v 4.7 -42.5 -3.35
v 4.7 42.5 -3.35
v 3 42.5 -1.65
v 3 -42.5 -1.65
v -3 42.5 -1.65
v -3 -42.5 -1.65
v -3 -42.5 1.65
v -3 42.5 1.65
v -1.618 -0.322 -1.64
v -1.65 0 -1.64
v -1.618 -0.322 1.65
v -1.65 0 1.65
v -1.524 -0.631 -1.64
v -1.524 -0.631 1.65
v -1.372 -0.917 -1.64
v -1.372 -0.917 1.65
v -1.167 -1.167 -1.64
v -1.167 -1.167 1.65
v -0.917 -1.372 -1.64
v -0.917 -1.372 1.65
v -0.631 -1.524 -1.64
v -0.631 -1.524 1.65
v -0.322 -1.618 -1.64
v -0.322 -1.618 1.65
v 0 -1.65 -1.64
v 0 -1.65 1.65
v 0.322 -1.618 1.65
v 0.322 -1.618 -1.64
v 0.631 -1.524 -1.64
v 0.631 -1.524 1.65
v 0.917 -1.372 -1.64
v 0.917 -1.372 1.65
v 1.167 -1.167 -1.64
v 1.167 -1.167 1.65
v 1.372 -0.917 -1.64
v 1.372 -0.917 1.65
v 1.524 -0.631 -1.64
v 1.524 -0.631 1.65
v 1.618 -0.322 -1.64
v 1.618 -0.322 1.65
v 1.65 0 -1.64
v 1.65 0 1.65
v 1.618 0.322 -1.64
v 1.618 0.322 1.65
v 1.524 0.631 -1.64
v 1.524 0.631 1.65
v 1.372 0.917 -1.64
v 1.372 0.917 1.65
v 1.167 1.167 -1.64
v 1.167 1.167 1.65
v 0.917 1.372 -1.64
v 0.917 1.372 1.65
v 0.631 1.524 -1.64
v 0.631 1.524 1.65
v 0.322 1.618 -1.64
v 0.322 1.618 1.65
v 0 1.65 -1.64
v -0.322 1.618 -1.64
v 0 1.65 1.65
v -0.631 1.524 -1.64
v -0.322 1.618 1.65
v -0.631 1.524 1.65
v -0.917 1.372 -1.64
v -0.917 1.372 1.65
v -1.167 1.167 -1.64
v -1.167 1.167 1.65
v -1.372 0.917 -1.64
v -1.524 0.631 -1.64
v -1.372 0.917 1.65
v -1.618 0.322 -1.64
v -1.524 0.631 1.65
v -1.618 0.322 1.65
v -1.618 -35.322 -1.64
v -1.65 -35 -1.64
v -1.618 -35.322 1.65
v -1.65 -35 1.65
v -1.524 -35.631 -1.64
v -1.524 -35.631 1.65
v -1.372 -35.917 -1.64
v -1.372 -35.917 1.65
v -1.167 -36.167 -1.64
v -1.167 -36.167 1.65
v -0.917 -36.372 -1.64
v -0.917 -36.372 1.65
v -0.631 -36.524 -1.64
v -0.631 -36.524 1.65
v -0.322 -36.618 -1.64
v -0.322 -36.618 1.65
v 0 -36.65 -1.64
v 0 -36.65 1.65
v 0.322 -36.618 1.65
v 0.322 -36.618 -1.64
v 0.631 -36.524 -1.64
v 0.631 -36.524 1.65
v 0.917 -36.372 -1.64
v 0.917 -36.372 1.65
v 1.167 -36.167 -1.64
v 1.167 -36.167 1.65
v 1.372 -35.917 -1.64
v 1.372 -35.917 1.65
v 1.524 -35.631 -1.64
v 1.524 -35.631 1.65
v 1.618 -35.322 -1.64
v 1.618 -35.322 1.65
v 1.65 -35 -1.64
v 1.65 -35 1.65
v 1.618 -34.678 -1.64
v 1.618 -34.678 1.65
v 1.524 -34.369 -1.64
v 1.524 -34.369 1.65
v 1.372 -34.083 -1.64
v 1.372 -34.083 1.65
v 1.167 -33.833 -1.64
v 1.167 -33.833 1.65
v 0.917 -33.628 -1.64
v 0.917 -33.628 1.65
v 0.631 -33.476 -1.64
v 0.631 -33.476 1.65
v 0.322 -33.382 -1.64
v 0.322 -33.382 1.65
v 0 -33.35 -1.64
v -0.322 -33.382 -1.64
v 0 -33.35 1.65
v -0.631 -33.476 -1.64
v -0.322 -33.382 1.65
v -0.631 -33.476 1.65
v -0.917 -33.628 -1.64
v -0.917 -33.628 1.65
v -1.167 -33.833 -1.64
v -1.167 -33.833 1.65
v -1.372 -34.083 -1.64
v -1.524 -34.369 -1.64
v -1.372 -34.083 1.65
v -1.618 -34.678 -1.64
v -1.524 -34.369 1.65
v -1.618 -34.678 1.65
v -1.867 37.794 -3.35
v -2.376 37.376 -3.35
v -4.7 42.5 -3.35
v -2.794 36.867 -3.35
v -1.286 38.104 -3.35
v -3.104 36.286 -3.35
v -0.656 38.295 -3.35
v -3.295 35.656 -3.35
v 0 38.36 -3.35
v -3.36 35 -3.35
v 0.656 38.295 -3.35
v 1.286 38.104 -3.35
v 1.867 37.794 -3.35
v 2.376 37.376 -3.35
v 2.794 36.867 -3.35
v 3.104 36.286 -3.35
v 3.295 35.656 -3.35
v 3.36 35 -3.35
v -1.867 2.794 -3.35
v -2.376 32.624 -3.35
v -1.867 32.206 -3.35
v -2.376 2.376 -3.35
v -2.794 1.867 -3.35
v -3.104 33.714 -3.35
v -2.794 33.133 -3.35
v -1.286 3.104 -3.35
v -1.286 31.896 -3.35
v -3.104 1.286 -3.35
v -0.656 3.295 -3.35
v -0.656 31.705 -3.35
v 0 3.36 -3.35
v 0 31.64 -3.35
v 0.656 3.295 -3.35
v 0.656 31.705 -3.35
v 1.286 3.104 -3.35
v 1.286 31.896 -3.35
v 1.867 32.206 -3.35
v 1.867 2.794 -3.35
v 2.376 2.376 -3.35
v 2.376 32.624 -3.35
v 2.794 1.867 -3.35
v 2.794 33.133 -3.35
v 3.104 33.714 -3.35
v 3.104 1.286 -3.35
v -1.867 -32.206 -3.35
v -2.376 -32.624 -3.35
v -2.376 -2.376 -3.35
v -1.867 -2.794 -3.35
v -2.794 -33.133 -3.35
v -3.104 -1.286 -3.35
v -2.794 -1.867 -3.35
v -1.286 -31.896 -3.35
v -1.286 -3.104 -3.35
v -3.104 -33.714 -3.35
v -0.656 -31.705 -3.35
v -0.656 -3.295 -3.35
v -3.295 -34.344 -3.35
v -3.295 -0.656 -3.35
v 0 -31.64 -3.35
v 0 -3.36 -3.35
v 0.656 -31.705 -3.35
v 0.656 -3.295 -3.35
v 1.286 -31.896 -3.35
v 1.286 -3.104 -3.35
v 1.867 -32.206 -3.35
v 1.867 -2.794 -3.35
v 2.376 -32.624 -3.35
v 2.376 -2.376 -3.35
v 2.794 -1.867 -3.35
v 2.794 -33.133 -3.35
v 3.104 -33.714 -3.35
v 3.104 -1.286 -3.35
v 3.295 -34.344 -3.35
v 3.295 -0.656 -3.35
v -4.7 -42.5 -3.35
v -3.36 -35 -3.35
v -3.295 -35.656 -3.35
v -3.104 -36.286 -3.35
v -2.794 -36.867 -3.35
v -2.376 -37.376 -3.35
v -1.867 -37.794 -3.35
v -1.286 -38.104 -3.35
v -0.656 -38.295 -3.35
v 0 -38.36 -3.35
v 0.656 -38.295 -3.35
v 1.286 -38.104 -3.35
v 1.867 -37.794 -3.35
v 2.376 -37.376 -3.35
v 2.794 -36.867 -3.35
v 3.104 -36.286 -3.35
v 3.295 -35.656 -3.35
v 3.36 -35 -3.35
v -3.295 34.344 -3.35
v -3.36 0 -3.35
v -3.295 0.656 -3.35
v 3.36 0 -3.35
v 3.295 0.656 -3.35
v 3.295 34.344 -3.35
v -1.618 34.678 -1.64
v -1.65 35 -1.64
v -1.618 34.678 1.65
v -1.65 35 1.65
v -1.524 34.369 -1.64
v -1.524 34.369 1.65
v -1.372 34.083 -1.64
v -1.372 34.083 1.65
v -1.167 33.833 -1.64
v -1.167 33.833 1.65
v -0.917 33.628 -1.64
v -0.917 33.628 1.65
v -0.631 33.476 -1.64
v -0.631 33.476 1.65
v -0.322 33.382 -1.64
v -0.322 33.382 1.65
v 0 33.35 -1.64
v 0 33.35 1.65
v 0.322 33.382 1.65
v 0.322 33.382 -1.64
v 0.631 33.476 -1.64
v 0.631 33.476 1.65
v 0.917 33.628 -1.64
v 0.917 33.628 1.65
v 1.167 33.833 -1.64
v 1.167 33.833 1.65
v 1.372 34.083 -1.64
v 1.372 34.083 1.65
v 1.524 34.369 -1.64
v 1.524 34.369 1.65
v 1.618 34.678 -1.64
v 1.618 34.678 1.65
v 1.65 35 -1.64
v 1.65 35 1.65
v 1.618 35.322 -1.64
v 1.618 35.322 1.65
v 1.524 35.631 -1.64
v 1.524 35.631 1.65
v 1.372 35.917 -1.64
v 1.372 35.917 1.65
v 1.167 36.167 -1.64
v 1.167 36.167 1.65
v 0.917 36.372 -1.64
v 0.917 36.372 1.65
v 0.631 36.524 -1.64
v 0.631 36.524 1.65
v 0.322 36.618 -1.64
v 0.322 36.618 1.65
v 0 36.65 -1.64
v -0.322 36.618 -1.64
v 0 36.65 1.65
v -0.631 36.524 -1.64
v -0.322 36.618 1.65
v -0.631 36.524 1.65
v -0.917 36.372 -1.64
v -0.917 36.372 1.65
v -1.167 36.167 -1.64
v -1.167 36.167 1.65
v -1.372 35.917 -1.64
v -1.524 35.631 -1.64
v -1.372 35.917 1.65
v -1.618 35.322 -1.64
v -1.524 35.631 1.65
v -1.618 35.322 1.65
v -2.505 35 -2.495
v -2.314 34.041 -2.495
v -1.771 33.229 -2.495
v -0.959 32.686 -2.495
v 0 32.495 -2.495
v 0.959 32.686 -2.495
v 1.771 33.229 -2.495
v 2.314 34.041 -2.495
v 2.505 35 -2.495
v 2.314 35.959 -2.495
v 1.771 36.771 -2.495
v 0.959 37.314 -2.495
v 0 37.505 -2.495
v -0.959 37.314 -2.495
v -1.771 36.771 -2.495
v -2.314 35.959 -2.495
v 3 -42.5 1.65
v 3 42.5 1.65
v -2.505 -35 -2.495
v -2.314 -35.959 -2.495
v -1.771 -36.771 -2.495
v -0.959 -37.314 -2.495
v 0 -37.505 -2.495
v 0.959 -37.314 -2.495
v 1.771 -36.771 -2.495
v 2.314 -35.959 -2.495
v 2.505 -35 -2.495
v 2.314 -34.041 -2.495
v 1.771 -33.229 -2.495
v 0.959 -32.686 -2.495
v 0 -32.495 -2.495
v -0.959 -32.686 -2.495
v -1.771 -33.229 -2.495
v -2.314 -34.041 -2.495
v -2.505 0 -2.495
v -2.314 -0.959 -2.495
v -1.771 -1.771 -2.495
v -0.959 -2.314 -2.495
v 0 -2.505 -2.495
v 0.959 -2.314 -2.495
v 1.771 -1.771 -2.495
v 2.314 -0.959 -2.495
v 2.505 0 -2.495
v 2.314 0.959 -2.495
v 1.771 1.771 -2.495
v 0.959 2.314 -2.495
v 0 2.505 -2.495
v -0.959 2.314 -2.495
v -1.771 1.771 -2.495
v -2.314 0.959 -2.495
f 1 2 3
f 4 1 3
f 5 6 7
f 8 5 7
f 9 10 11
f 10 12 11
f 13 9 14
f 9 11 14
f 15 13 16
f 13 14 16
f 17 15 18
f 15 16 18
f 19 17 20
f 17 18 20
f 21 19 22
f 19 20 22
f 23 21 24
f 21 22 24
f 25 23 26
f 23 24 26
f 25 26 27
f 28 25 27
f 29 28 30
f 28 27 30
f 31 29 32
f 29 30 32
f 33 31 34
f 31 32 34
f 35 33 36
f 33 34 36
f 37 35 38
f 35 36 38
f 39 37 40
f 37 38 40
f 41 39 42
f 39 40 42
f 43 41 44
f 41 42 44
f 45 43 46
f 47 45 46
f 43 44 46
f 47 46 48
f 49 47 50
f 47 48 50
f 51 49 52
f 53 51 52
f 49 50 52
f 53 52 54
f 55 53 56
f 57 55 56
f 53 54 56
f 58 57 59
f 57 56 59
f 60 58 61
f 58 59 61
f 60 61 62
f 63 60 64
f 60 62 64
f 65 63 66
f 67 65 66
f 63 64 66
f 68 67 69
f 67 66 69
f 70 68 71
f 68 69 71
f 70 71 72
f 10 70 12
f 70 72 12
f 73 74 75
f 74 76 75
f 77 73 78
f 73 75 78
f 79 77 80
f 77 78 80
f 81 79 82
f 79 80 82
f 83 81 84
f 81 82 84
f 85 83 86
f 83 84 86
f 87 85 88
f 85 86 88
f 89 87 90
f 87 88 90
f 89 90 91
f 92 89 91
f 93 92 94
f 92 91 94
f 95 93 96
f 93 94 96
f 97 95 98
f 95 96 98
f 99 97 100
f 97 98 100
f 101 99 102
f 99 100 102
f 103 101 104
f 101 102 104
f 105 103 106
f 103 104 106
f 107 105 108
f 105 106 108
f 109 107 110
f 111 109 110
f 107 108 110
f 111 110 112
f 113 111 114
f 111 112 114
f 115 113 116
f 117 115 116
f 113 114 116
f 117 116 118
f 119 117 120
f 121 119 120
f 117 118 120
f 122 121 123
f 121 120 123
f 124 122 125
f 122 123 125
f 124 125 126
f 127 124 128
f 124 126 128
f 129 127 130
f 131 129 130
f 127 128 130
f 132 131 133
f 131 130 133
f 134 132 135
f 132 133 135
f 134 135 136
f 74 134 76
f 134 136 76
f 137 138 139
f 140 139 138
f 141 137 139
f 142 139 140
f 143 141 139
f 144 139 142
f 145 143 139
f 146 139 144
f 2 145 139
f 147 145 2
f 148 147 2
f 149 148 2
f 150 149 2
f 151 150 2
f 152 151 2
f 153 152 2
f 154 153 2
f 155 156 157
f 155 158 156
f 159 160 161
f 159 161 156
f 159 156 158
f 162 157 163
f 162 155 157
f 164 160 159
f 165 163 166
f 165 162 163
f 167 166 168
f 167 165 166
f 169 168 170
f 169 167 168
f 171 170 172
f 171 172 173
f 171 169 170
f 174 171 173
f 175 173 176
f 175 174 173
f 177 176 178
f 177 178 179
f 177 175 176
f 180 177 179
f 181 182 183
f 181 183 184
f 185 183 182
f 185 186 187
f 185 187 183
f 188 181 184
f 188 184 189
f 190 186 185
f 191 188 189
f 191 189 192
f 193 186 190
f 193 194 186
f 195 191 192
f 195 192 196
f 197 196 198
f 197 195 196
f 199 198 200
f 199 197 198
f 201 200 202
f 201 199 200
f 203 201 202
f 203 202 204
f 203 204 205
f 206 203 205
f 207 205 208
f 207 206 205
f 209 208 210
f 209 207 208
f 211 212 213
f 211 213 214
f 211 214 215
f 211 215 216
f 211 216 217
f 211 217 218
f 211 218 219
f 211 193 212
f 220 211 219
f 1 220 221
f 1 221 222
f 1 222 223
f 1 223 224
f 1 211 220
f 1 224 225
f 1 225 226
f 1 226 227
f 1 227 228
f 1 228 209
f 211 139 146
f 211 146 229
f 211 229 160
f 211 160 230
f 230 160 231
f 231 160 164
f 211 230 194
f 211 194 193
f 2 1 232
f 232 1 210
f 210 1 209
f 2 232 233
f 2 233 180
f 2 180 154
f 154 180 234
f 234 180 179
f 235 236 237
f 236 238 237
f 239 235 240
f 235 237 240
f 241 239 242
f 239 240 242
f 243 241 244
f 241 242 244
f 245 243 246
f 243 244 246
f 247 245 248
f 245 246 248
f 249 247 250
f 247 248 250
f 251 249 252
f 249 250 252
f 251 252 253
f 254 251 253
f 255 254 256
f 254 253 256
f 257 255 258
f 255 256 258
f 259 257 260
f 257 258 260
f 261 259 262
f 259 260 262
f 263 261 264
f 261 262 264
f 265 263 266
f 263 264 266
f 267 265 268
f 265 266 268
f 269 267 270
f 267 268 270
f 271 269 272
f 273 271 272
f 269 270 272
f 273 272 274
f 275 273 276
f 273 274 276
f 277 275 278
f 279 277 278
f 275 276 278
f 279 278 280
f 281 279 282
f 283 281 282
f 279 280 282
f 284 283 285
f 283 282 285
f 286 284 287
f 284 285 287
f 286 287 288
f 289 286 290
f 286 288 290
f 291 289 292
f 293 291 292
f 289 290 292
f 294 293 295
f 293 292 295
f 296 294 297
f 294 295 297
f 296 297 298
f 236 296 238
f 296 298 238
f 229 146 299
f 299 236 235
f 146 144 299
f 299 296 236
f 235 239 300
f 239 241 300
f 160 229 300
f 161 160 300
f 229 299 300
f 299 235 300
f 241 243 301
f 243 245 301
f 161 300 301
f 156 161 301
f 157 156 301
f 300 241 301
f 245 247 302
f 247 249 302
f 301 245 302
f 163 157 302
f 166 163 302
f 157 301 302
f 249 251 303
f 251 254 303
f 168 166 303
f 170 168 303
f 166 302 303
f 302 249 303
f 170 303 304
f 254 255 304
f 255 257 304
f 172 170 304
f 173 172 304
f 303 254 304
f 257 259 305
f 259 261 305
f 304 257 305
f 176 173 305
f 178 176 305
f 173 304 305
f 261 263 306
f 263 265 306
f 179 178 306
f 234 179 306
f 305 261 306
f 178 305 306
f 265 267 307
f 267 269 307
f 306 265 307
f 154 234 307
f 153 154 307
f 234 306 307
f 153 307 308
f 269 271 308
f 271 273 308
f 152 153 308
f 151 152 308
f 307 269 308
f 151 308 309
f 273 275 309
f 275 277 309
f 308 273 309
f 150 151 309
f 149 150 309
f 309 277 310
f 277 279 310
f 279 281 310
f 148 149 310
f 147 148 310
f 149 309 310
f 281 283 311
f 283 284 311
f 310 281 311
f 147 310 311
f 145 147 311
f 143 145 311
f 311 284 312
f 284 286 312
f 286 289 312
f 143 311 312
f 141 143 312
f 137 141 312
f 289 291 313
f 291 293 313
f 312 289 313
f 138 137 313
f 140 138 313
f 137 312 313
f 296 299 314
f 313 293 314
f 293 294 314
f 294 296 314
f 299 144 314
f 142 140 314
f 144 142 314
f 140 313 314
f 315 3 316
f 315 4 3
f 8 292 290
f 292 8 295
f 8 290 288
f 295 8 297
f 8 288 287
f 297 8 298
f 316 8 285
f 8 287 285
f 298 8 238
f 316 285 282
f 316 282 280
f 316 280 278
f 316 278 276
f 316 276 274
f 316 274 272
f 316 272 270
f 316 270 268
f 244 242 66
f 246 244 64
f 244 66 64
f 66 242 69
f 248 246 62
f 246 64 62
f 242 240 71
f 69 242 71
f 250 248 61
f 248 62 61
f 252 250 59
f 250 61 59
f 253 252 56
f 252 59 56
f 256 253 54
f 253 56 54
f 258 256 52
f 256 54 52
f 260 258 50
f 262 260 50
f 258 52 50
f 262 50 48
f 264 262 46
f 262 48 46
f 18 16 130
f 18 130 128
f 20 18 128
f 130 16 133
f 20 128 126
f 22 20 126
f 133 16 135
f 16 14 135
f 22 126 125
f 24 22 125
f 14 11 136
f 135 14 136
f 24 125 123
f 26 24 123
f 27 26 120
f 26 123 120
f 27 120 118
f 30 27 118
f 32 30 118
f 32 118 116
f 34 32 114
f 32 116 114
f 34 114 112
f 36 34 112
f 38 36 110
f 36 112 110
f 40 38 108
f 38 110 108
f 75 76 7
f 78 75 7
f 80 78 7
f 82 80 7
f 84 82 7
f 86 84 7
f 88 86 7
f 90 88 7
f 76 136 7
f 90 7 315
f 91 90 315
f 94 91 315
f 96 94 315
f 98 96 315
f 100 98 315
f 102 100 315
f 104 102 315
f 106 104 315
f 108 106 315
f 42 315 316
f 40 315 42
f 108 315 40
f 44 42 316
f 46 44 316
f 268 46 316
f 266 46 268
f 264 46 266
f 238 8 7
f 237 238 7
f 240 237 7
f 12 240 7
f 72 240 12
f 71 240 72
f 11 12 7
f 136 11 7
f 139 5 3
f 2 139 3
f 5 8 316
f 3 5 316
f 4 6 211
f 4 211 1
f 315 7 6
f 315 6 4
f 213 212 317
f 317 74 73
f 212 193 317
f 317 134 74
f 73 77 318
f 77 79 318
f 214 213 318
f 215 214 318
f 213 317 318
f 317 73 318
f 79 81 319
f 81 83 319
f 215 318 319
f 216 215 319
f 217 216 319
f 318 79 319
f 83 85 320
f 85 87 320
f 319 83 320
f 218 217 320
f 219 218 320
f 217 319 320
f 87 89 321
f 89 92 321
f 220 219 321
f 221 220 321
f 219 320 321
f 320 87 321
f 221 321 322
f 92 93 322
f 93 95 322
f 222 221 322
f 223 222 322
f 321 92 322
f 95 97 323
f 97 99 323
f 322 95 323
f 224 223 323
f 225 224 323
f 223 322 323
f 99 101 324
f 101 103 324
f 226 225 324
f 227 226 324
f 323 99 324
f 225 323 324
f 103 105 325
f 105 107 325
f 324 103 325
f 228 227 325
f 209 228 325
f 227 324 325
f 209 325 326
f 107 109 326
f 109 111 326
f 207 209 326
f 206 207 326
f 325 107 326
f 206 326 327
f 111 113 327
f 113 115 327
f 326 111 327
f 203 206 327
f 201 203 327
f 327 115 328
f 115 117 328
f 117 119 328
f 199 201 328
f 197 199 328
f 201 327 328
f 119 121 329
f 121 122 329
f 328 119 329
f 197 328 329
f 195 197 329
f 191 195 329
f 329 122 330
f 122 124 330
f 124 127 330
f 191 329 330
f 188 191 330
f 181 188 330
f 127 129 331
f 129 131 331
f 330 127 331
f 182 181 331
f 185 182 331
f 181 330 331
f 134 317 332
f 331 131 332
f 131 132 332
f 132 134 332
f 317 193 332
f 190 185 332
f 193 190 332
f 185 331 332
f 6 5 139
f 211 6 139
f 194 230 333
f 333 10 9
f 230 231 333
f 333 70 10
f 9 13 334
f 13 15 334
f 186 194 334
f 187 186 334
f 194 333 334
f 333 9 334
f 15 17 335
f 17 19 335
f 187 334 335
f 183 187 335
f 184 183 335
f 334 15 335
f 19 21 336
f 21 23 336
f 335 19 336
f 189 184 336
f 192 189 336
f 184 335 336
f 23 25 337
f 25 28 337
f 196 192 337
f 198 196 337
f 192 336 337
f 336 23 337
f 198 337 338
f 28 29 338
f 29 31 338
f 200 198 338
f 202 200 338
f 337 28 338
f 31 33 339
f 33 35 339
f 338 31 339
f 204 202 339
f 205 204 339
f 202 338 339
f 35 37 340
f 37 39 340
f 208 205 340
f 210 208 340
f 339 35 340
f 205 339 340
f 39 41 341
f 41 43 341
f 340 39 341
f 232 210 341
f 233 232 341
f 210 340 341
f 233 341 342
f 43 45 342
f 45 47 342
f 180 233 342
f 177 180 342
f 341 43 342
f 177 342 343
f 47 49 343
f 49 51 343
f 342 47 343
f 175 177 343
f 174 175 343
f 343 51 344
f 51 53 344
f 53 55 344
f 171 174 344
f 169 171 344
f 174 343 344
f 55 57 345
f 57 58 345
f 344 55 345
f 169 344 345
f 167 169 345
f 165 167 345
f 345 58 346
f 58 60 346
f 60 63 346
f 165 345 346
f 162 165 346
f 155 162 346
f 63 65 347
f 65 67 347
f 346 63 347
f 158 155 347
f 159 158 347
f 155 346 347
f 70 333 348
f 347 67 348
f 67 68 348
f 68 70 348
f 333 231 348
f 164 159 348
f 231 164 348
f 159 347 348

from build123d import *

# Parameters (mm, degrees)
F0_W           = 6
F0_H           = 3.3
F1_DEPTH       = 42.5
F3_D           = 3.3
F3_CSINK_D     = 6.72
F3_CSINK_ANGLE = 90


with BuildPart() as f1:
    # F0 (on Front) → F1 (new body, symmetric)
    with BuildSketch(Plane.XZ):
        Rectangle(F0_W, F0_H)
        Polygon((4.7, -3.35), (3, -1.65), (-3, -1.65), (-4.7, -3.35), align=None)
    extrude(amount=F1_DEPTH, both=True)

    # F3 (through all)
    with Locations(Plane(origin=(0, 0, -3.35), x_dir=(1, 0, 0), z_dir=(0, 0, -1))):
        with Locations((0, 0), (0, 35), (0, -35)):
            CounterSinkHole(F3_D / 2, F3_CSINK_D / 2, counter_sink_angle=F3_CSINK_ANGLE)


solid = f1.part
